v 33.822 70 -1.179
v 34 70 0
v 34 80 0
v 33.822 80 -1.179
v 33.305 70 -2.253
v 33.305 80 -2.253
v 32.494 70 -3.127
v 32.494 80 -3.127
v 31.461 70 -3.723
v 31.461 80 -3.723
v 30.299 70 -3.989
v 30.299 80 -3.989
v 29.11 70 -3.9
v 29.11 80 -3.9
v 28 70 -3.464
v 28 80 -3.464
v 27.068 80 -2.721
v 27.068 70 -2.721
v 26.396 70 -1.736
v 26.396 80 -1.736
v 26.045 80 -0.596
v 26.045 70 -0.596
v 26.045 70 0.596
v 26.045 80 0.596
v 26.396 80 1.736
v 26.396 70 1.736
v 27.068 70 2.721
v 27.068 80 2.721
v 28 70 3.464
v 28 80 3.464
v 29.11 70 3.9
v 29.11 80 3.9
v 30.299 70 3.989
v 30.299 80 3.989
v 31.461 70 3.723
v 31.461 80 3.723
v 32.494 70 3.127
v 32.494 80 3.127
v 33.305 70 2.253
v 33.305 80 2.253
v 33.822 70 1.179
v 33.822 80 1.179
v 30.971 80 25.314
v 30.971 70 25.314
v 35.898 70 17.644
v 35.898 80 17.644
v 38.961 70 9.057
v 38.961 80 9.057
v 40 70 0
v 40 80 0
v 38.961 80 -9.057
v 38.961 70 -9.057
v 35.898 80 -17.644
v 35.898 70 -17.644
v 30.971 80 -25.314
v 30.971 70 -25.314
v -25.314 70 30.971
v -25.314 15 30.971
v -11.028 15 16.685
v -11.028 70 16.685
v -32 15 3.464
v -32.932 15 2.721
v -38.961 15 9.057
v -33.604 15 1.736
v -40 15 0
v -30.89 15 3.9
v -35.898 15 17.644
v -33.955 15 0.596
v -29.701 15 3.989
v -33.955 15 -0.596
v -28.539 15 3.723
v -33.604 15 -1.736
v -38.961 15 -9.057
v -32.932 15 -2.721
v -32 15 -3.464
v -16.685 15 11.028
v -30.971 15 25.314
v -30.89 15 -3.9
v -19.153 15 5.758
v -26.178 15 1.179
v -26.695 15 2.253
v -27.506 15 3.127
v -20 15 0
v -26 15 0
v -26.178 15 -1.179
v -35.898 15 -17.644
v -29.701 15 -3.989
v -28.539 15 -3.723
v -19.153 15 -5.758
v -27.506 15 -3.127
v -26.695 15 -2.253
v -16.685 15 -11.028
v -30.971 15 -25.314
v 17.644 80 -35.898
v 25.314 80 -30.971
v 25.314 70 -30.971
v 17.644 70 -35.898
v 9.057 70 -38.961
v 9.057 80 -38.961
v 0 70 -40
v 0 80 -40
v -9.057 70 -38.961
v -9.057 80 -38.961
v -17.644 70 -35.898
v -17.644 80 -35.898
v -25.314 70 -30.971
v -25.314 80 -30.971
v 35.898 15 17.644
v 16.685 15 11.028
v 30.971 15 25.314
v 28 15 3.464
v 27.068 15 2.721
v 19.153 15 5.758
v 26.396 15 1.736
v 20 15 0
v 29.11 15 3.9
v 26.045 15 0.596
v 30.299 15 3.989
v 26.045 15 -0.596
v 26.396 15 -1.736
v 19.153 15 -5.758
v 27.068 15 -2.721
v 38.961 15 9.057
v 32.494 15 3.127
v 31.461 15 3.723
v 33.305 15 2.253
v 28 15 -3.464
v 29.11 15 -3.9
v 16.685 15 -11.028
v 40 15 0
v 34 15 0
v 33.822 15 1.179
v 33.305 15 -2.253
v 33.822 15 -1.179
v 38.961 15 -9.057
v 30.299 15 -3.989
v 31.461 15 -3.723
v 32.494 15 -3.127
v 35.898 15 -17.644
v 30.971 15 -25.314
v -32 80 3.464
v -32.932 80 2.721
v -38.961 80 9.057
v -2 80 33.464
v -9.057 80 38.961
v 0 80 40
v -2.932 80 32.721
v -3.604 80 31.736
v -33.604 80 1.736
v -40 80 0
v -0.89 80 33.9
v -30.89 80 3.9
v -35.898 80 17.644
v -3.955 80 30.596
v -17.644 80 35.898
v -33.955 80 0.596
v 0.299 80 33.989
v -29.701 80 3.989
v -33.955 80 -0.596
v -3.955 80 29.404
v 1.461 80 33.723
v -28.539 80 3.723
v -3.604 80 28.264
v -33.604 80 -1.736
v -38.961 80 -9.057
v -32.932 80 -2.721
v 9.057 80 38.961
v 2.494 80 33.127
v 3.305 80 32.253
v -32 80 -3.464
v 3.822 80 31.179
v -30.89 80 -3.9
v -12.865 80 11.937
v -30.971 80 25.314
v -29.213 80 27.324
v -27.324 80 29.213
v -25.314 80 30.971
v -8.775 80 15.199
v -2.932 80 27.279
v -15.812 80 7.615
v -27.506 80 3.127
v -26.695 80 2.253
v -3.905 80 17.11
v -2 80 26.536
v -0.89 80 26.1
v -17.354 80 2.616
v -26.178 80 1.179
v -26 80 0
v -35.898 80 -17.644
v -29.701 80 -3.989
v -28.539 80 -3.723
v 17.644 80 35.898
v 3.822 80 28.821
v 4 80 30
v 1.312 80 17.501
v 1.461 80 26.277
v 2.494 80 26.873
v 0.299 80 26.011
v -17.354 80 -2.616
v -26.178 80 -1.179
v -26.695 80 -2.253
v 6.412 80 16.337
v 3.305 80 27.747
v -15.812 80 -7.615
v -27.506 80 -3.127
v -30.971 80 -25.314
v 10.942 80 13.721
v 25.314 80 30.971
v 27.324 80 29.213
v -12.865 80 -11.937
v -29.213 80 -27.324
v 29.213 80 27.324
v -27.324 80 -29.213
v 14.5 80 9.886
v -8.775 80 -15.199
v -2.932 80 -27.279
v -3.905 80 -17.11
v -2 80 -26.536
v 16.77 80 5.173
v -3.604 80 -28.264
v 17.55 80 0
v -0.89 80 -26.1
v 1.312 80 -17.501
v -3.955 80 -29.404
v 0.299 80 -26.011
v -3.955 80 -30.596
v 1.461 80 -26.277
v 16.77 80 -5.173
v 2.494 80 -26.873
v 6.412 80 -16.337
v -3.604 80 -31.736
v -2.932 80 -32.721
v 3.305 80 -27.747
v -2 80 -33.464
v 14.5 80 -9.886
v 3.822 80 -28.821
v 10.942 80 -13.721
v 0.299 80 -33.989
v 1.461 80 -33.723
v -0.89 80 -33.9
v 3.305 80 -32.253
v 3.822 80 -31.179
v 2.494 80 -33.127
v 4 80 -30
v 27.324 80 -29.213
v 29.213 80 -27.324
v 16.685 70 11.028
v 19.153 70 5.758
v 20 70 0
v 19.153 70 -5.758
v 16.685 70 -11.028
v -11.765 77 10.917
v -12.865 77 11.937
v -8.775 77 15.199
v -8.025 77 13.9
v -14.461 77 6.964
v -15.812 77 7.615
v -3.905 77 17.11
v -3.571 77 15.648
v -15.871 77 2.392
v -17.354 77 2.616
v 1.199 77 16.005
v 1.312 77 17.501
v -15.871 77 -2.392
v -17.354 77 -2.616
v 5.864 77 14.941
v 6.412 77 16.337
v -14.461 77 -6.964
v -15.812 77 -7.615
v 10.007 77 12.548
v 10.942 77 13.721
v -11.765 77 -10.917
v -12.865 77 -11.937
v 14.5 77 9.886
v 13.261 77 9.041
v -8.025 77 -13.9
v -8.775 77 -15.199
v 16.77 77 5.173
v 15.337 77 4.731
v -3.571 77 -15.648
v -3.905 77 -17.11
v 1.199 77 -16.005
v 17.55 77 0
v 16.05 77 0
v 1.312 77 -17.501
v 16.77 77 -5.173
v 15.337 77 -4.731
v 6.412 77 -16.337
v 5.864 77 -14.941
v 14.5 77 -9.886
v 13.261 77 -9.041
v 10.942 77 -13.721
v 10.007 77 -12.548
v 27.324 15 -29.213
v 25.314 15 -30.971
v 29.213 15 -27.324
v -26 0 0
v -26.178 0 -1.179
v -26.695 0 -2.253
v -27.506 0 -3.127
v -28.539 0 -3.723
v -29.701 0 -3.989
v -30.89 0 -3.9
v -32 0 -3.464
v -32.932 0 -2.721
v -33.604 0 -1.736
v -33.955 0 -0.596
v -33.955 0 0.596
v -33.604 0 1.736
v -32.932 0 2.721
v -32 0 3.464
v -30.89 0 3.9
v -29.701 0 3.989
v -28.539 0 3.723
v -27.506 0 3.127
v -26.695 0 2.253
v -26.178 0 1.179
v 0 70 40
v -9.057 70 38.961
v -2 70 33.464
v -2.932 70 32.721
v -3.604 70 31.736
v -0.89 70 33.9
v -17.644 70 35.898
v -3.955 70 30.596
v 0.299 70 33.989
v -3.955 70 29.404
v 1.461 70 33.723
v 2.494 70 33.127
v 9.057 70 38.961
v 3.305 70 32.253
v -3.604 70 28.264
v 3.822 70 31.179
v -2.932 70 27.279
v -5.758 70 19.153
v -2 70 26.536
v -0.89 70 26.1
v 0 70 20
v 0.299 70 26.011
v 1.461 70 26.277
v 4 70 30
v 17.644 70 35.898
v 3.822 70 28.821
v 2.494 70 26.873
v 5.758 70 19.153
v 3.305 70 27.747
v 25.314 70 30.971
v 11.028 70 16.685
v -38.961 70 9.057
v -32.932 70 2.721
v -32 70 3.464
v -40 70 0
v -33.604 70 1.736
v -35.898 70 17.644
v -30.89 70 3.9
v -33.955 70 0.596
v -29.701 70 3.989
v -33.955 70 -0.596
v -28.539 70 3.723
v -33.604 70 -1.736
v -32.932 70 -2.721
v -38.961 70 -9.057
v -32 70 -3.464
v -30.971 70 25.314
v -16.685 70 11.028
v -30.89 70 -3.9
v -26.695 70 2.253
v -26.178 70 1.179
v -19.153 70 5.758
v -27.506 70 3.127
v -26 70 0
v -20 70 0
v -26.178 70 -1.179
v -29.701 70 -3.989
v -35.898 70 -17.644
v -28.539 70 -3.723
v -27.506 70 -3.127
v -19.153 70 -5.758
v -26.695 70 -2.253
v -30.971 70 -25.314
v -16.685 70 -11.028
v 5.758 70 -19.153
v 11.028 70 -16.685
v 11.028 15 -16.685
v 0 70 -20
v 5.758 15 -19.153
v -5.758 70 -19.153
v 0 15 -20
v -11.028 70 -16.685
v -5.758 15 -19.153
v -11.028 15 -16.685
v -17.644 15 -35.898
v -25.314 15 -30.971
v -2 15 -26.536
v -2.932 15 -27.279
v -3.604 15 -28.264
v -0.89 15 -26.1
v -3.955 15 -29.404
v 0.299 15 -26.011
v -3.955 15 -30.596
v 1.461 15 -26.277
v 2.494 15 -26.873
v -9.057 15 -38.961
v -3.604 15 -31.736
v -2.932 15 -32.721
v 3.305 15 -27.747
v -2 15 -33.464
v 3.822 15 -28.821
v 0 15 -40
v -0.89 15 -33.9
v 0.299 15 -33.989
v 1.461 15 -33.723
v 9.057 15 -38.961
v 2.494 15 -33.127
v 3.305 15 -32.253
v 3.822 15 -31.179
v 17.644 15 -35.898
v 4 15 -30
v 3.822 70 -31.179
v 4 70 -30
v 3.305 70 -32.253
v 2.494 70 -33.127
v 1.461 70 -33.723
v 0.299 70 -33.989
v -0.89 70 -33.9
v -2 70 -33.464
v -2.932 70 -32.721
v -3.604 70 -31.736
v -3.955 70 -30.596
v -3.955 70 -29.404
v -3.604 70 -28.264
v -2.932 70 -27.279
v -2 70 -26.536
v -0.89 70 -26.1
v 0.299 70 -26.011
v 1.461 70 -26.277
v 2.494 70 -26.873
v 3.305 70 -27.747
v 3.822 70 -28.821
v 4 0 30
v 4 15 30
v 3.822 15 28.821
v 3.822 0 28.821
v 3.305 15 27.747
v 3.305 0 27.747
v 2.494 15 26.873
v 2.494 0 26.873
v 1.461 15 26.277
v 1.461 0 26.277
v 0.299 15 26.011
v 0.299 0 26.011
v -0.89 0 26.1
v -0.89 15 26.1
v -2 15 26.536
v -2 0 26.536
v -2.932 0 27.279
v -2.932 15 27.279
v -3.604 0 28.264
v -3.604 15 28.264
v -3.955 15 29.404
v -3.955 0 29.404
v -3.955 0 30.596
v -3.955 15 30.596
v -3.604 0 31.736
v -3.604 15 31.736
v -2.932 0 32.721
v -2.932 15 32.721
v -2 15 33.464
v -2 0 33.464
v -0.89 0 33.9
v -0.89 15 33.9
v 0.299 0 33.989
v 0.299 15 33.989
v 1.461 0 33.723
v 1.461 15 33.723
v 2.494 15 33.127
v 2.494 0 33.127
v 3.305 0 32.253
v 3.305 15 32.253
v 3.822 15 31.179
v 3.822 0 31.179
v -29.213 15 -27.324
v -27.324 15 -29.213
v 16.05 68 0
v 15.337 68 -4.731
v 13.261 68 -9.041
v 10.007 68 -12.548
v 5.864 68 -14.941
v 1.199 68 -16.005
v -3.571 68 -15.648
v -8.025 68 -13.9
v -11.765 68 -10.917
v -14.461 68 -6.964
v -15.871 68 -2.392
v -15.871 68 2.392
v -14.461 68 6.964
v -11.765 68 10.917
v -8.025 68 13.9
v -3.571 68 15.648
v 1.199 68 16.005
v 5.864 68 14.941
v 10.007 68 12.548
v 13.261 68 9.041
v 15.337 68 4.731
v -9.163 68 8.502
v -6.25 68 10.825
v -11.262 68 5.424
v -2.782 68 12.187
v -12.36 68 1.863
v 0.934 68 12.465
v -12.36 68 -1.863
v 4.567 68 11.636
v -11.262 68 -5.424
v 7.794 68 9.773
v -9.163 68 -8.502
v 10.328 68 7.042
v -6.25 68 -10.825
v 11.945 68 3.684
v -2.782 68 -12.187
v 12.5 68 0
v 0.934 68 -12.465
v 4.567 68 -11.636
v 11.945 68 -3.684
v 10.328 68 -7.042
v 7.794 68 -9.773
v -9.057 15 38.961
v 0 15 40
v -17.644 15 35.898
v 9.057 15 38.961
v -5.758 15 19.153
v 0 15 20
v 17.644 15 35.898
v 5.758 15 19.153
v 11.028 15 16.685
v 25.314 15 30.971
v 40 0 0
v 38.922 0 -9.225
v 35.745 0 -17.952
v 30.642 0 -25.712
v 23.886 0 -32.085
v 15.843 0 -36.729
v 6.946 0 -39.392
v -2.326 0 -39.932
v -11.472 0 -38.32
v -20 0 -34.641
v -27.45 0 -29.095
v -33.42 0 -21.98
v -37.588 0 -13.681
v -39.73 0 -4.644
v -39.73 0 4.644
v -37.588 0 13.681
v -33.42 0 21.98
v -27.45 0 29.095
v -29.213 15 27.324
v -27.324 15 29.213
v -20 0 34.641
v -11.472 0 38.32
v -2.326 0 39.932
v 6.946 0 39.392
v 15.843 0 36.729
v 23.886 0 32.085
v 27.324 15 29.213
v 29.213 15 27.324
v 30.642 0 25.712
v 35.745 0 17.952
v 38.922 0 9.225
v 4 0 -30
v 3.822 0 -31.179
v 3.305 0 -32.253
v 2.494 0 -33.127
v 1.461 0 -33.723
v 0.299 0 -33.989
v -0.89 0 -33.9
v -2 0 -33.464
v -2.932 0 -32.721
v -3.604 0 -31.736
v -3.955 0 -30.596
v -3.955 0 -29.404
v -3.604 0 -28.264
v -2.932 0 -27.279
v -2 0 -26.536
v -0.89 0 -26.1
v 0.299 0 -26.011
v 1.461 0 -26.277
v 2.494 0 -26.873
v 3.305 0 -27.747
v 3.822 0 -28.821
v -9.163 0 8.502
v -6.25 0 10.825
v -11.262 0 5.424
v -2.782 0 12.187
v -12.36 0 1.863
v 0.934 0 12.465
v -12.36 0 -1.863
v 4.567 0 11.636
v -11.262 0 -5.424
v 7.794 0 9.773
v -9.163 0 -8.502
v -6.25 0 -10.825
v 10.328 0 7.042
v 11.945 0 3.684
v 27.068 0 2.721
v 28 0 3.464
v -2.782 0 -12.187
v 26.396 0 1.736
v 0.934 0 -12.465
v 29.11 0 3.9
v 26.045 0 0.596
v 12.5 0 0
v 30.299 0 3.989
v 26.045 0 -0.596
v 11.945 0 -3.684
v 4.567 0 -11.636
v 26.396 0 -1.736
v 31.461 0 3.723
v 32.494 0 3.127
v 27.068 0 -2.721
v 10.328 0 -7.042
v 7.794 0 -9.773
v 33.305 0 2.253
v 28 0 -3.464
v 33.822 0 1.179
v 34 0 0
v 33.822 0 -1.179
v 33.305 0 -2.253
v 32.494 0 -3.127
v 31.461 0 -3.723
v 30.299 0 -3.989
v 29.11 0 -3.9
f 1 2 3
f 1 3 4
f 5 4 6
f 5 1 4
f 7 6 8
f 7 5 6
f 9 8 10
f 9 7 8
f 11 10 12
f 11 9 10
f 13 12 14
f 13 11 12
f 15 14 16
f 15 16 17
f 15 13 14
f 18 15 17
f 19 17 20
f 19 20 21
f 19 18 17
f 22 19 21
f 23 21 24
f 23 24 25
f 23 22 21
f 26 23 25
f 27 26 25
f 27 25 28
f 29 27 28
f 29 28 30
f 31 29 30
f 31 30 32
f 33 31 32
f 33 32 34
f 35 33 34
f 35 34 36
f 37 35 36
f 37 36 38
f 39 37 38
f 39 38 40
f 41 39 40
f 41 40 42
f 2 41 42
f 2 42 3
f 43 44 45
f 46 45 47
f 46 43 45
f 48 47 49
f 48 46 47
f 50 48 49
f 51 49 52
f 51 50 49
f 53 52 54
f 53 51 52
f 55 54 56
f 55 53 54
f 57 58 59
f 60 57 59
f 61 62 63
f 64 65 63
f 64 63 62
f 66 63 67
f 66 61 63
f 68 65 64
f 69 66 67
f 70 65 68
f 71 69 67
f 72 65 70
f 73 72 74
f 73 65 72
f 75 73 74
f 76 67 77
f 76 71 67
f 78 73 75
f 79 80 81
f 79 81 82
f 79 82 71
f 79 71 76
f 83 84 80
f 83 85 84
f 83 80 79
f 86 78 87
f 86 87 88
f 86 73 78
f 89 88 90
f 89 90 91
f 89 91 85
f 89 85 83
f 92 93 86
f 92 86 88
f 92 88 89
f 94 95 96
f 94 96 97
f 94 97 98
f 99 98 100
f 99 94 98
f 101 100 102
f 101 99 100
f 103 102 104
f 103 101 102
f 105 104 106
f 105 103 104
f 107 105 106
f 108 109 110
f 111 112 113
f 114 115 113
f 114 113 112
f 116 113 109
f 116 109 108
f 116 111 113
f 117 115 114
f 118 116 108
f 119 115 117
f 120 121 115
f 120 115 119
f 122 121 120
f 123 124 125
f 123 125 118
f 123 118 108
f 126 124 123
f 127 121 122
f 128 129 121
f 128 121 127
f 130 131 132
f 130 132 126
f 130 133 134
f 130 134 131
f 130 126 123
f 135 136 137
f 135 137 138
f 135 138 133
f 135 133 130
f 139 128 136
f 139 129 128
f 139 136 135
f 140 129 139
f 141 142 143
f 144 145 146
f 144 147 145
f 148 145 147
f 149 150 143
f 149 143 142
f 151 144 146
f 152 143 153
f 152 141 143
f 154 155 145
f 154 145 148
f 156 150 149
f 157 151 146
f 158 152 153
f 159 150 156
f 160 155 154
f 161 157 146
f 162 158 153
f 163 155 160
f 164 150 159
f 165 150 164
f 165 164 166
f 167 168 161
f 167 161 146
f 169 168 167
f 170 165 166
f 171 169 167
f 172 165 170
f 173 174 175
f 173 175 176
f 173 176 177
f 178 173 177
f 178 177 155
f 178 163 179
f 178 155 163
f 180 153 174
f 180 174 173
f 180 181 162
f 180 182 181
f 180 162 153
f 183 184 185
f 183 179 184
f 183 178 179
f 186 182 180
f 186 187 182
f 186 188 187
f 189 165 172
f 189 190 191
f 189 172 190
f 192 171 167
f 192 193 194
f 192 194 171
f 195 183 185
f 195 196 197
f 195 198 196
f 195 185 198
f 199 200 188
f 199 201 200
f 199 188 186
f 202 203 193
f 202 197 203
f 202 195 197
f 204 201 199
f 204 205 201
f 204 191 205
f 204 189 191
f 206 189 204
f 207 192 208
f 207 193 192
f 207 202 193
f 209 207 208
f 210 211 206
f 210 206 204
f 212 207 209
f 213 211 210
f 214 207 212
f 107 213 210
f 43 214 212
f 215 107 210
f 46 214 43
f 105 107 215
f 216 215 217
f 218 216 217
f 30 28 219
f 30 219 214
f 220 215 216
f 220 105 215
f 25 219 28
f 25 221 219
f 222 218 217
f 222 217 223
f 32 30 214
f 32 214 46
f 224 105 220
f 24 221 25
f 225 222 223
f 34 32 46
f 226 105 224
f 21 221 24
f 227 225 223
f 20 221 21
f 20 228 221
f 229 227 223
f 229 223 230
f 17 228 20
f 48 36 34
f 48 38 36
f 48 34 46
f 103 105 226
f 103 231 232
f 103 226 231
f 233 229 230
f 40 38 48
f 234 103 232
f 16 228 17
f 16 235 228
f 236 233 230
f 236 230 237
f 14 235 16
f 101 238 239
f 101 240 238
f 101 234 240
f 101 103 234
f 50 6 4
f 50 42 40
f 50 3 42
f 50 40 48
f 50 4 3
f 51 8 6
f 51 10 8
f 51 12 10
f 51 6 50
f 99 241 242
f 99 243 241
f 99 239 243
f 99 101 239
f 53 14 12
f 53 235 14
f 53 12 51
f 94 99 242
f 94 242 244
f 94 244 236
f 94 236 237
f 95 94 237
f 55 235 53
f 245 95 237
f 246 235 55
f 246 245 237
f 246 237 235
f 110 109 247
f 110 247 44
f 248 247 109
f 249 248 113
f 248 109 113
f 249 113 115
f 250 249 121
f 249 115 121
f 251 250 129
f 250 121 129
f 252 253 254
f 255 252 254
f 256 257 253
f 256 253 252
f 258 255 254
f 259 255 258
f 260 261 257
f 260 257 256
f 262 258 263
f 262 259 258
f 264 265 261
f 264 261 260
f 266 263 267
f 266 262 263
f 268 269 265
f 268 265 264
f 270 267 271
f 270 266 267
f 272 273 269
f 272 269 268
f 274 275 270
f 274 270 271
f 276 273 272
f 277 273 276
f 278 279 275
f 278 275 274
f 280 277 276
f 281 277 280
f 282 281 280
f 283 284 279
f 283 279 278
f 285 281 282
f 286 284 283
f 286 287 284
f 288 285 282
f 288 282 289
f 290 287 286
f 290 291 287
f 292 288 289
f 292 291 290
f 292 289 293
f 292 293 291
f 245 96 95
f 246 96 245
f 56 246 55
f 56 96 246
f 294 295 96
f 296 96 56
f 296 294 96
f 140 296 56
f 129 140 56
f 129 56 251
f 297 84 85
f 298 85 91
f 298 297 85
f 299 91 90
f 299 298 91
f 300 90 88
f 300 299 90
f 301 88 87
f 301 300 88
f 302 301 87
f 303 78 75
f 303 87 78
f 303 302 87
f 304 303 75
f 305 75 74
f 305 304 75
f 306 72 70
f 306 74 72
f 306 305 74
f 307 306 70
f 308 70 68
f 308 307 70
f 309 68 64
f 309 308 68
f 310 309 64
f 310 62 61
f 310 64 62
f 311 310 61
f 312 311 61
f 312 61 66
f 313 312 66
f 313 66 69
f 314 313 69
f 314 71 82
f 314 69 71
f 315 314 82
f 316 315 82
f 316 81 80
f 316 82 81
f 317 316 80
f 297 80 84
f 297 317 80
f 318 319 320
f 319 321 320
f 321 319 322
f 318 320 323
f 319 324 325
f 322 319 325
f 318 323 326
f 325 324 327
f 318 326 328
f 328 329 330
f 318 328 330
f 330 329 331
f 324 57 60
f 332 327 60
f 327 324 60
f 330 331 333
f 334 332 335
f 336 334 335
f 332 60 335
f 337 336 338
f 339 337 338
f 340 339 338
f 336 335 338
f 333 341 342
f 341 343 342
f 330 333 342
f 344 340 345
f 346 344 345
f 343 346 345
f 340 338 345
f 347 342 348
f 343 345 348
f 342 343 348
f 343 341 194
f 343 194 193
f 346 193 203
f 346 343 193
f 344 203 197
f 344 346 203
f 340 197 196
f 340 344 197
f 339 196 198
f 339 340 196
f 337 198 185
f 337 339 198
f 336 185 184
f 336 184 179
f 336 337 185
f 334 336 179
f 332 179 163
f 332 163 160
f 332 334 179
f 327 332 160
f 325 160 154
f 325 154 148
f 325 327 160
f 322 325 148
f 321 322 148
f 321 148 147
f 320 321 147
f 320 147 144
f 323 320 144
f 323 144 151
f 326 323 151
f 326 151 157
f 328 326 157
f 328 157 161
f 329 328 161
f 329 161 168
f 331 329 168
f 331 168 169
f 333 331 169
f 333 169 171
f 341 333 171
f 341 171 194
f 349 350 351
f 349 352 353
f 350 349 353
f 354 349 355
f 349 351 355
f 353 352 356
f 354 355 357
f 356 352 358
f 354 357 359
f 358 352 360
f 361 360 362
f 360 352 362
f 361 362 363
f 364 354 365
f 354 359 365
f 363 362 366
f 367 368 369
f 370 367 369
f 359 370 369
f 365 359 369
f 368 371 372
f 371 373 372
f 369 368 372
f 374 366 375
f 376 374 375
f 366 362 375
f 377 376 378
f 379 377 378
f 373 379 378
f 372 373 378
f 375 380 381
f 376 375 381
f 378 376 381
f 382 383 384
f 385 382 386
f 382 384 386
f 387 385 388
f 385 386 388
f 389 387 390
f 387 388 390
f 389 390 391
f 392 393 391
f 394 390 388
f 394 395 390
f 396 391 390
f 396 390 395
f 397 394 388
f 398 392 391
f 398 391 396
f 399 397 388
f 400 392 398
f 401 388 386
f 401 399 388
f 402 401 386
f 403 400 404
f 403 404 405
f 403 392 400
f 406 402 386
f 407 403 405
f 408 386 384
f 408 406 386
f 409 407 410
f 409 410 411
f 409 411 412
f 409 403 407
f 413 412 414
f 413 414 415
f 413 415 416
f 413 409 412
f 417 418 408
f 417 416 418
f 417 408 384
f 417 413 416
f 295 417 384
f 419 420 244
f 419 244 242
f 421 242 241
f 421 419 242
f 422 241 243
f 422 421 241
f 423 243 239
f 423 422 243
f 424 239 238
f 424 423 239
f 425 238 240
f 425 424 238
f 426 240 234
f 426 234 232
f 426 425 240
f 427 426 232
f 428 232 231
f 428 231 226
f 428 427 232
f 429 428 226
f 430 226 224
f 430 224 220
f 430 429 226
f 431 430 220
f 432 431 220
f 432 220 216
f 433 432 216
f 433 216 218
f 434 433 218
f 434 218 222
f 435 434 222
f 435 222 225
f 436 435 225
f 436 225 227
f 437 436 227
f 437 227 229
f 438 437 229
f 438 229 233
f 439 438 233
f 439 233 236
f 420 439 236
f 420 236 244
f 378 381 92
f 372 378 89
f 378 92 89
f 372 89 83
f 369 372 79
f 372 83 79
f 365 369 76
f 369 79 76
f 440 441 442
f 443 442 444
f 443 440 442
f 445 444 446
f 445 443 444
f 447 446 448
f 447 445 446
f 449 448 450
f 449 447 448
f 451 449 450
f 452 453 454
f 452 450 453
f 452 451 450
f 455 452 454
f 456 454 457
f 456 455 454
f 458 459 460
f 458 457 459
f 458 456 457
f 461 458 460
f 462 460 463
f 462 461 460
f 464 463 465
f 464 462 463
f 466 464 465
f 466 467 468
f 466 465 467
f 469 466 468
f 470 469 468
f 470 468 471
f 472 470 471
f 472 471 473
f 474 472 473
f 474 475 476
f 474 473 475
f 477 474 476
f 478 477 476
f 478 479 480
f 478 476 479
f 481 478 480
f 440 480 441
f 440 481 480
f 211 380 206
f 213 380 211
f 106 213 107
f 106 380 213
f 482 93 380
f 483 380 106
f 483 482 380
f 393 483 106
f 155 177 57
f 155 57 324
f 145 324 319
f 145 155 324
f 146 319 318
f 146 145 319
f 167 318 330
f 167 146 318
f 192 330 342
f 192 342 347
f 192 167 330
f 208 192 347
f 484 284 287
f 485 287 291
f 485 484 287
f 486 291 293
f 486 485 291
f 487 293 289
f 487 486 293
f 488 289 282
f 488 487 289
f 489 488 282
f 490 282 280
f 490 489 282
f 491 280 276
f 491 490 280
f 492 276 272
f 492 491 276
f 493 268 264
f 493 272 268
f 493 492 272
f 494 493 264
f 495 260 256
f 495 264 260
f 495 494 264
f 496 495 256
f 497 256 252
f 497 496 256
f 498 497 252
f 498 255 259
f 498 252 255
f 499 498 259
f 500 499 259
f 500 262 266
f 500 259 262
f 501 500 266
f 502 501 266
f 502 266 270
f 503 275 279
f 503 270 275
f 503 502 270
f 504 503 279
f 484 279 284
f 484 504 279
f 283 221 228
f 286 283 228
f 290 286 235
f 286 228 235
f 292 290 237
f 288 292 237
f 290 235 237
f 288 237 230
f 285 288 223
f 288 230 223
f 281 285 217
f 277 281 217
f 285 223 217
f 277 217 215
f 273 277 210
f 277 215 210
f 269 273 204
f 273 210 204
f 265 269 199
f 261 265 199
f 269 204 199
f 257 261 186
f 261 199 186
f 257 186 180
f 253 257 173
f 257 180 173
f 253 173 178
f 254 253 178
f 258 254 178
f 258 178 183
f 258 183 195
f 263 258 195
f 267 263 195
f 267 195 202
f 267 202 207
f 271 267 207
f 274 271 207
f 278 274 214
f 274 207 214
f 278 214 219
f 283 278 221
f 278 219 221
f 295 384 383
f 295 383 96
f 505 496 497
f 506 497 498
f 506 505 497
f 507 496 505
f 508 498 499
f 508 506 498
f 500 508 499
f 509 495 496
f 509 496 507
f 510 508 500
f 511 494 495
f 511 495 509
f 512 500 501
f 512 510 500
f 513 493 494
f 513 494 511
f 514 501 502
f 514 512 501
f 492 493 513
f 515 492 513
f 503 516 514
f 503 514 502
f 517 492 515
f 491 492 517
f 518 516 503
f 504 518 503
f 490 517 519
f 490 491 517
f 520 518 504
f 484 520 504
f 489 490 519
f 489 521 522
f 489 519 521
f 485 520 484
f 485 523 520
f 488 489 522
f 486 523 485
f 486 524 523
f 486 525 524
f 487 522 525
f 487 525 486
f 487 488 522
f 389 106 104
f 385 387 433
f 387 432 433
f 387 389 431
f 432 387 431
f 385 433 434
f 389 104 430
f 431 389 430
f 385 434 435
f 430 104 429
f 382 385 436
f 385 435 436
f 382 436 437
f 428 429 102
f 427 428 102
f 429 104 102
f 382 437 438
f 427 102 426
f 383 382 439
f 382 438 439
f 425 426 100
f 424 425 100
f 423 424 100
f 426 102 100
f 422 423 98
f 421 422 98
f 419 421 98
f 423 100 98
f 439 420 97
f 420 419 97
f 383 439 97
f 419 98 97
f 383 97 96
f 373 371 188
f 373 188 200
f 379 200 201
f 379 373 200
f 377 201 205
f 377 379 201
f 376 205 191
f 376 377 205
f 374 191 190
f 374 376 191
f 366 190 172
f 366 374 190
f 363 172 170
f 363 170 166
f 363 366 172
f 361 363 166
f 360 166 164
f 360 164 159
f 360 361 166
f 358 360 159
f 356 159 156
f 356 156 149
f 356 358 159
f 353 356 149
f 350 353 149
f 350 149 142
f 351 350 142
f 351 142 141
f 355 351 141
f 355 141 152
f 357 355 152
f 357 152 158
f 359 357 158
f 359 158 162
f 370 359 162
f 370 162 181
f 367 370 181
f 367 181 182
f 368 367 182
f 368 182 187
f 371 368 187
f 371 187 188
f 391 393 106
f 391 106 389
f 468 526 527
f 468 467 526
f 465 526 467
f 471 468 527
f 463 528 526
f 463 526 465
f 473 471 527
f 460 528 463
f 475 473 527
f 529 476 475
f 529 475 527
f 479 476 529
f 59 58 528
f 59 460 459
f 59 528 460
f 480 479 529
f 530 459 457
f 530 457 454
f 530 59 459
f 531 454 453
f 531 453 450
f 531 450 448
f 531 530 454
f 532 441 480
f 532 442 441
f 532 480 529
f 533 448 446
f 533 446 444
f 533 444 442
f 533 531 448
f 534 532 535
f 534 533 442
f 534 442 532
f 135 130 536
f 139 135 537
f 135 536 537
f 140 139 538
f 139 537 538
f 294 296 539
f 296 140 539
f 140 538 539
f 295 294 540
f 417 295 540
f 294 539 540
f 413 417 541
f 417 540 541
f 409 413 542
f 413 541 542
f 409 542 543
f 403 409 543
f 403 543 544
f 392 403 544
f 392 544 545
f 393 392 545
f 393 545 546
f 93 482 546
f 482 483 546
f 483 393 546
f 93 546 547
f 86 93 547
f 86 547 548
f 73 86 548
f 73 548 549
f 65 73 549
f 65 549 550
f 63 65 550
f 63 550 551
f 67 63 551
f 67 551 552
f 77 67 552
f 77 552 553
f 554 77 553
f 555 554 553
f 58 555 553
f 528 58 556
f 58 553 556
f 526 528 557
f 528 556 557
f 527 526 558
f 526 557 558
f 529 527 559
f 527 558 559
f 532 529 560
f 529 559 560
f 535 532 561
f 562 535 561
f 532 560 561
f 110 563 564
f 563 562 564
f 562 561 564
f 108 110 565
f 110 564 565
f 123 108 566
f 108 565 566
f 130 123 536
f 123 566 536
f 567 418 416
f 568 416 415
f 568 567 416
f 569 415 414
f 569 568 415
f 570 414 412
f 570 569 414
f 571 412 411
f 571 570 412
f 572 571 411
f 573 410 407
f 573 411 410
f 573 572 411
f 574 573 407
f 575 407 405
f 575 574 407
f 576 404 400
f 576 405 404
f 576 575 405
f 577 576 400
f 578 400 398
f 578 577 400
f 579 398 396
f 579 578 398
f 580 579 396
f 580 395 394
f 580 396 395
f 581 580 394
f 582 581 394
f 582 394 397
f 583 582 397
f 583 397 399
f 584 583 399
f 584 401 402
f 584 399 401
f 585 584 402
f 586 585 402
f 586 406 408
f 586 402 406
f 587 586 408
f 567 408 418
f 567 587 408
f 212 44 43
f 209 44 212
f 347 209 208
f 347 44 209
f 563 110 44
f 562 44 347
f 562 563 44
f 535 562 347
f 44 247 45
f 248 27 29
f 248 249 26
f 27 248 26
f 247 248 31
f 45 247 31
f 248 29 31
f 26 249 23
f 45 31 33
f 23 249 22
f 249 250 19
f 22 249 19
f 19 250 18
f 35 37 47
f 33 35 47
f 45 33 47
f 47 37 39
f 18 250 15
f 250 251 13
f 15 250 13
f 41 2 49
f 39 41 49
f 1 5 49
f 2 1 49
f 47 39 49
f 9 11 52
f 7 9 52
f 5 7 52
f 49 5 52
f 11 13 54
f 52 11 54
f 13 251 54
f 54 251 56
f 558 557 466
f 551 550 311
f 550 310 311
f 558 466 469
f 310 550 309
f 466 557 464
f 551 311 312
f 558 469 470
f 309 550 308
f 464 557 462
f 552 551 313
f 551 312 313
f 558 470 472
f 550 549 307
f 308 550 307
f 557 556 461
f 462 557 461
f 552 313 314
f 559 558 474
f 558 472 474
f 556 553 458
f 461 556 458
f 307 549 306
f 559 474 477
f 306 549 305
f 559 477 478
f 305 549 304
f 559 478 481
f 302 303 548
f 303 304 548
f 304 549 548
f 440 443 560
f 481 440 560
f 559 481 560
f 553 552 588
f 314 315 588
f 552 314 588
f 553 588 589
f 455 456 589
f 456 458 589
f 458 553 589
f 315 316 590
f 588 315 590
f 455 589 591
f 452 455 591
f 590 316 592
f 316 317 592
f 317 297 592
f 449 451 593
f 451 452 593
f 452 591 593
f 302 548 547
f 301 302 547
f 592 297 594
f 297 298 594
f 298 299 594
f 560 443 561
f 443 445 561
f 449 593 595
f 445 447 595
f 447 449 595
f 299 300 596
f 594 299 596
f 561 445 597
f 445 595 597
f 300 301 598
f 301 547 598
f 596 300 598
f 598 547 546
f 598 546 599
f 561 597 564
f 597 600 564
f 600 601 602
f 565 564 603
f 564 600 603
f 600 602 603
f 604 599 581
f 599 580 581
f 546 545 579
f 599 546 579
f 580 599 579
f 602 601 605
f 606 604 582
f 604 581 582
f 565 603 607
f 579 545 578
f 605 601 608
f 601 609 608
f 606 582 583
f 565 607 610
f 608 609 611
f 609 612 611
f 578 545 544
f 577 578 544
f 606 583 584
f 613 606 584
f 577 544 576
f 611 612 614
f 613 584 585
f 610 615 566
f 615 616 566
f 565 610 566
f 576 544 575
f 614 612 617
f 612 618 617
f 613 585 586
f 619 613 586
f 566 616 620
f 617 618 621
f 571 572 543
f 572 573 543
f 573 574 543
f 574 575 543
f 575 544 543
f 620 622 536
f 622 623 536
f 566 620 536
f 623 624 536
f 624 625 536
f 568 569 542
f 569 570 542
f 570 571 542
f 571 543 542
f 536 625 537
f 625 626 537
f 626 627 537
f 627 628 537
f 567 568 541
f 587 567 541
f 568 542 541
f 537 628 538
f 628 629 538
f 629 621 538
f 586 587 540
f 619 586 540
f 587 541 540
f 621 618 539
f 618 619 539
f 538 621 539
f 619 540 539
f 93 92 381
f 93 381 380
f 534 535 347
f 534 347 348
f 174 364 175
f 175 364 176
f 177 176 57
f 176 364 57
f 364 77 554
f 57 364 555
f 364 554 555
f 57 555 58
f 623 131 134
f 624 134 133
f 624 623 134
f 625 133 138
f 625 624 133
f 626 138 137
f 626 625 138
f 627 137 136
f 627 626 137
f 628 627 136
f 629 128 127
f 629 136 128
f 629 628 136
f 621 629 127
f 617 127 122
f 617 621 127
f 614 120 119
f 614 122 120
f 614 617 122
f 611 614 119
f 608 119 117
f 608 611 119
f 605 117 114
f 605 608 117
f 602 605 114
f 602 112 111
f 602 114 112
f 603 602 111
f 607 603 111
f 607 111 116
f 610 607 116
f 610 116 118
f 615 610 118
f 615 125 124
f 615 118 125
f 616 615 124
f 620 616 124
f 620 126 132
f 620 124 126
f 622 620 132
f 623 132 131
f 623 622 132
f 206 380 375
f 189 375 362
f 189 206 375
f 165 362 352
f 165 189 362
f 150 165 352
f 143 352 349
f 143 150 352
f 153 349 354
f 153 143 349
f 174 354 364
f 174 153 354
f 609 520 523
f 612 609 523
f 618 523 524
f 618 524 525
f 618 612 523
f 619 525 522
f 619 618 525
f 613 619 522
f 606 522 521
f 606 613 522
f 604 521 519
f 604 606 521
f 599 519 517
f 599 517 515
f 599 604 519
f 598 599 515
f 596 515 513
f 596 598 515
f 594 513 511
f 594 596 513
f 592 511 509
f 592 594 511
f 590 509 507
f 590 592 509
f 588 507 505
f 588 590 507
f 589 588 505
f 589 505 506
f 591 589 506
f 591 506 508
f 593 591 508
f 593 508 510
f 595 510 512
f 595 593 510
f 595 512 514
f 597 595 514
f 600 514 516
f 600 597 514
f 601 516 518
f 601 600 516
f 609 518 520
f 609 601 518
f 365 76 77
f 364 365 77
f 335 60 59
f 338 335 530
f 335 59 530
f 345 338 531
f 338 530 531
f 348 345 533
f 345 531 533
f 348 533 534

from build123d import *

# Parameters (mm, degrees)
SKETCH1_R           = 40
SKETCH1_R_2         = 12.5
BOSS_EXTRUDE1_DEPTH = 15
SKETCH3_R           = 20
SKETCH3_R_2         = 12.5
BOSS_EXTRUDE2_DEPTH = 53
SKETCH4_R           = 20
SKETCH4_R_2         = 16.05
BOSS_EXTRUDE3_DEPTH = 12
BOSS_EXTRUDE4_DEPTH = 65
SKETCH6_R           = 17.55
CUT_EXTRUDE2_DEPTH  = 3
SKETCH7_R           = 40
SKETCH7_R_2         = 20
BOSS_EXTRUDE5_DEPTH = 10
SKETCH2_R           = 4
CUT_EXTRUDE1_DEPTH  = 80


with BuildPart() as part:
    # Sketch1 → Boss-Extrude1 (new body)
    with BuildSketch(Plane(origin=(0, 0, 0), x_dir=(1, 0, 0), z_dir=(0, 1, 0))):
        Circle(SKETCH1_R)
        Circle(SKETCH1_R_2, mode=Mode.SUBTRACT)
    extrude(amount=BOSS_EXTRUDE1_DEPTH)

    # Sketch3 → Boss-Extrude2 (add)
    with BuildSketch(Plane(origin=(0, 15, 0), x_dir=(1, 0, 0), z_dir=(0, 1, 0))):
        Circle(SKETCH3_R)
        Circle(SKETCH3_R_2, mode=Mode.SUBTRACT)
    extrude(amount=BOSS_EXTRUDE2_DEPTH)

    # Sketch4 → Boss-Extrude3 (add)
    with BuildSketch(Plane(origin=(0, 68, 0), x_dir=(1, 0, 0), z_dir=(0, 1, 0))):
        Circle(SKETCH4_R)
        Circle(SKETCH4_R_2, mode=Mode.SUBTRACT)
    extrude(amount=BOSS_EXTRUDE3_DEPTH)

    # Sketch5 → Boss-Extrude4 (add)
    with BuildSketch(Plane(origin=(0, 15, 0), x_dir=(1, 0, 0), z_dir=(0, 1, 0))):
        with BuildLine():
            Line((-16.684833585, -11.027979336), (-30.970921684, -25.314067434))
            ThreePointArc((-30.970921684, -25.314067434), (-28.284271247, -28.284271247), (-25.314067434, -30.970921684))
            Line((-25.314067434, -30.970921684), (-11.027979336, -16.684833585))
            ThreePointArc((-11.027979336, -16.684833585), (-14.142135624, -14.142135624), (-16.684833585, -11.027979336))
        make_face()
        with BuildLine():
            Line((-16.684833585, 11.027979336), (-30.970921684, 25.314067434))
            ThreePointArc((-30.970921684, 25.314067434), (-28.284271247, 28.284271247), (-25.314067434, 30.970921684))
            Line((-25.314067434, 30.970921684), (-11.027979336, 16.684833585))
            ThreePointArc((-11.027979336, 16.684833585), (-14.142135624, 14.142135624), (-16.684833585, 11.027979336))
        make_face()
        with BuildLine():
            Line((11.027979336, 16.684833585), (25.314067434, 30.970921684))
            ThreePointArc((25.314067434, 30.970921684), (28.284271247, 28.284271247), (30.970921684, 25.314067434))
            Line((30.970921684, 25.314067434), (16.684833585, 11.027979336))
            ThreePointArc((16.684833585, 11.027979336), (14.142135624, 14.142135624), (11.027979336, 16.684833585))
        make_face()
        with BuildLine():
            Line((16.684833585, -11.027979336), (30.970921684, -25.314067434))
            ThreePointArc((30.970921684, -25.314067434), (28.284271247, -28.284271247), (25.314067434, -30.970921684))
            Line((25.314067434, -30.970921684), (11.027979336, -16.684833585))
            ThreePointArc((11.027979336, -16.684833585), (14.142135624, -14.142135624), (16.684833585, -11.027979336))
        make_face()
    extrude(amount=BOSS_EXTRUDE4_DEPTH)

    # Sketch6 → Cut-Extrude2 (cut)
    with BuildSketch(Plane(origin=(0, 80, 0), x_dir=(1, 0, 0), z_dir=(0, 1, 0))):
        Circle(SKETCH6_R)
    extrude(amount=-CUT_EXTRUDE2_DEPTH, mode=Mode.SUBTRACT)

    # Sketch7 → Boss-Extrude5 (add)
    with BuildSketch(Plane(origin=(0, 80, 0), x_dir=(1, 0, 0), z_dir=(0, 1, 0))):
        Circle(SKETCH7_R)
        Circle(SKETCH7_R_2, mode=Mode.SUBTRACT)
    extrude(amount=-BOSS_EXTRUDE5_DEPTH)

    # Sketch2 → Cut-Extrude1 (cut)
    with BuildSketch(Plane(origin=(0, 0, 0), x_dir=(1, 0, 0), z_dir=(0, 1, 0))):
        with Locations((0, 30)):
            Circle(SKETCH2_R)
        with Locations((30, 0)):
            Circle(SKETCH2_R)
        with Locations((0, -30)):
            Circle(SKETCH2_R)
        with Locations((-30, 0)):
            Circle(SKETCH2_R)
    extrude(amount=CUT_EXTRUDE1_DEPTH, mode=Mode.SUBTRACT)


solid = part.part
